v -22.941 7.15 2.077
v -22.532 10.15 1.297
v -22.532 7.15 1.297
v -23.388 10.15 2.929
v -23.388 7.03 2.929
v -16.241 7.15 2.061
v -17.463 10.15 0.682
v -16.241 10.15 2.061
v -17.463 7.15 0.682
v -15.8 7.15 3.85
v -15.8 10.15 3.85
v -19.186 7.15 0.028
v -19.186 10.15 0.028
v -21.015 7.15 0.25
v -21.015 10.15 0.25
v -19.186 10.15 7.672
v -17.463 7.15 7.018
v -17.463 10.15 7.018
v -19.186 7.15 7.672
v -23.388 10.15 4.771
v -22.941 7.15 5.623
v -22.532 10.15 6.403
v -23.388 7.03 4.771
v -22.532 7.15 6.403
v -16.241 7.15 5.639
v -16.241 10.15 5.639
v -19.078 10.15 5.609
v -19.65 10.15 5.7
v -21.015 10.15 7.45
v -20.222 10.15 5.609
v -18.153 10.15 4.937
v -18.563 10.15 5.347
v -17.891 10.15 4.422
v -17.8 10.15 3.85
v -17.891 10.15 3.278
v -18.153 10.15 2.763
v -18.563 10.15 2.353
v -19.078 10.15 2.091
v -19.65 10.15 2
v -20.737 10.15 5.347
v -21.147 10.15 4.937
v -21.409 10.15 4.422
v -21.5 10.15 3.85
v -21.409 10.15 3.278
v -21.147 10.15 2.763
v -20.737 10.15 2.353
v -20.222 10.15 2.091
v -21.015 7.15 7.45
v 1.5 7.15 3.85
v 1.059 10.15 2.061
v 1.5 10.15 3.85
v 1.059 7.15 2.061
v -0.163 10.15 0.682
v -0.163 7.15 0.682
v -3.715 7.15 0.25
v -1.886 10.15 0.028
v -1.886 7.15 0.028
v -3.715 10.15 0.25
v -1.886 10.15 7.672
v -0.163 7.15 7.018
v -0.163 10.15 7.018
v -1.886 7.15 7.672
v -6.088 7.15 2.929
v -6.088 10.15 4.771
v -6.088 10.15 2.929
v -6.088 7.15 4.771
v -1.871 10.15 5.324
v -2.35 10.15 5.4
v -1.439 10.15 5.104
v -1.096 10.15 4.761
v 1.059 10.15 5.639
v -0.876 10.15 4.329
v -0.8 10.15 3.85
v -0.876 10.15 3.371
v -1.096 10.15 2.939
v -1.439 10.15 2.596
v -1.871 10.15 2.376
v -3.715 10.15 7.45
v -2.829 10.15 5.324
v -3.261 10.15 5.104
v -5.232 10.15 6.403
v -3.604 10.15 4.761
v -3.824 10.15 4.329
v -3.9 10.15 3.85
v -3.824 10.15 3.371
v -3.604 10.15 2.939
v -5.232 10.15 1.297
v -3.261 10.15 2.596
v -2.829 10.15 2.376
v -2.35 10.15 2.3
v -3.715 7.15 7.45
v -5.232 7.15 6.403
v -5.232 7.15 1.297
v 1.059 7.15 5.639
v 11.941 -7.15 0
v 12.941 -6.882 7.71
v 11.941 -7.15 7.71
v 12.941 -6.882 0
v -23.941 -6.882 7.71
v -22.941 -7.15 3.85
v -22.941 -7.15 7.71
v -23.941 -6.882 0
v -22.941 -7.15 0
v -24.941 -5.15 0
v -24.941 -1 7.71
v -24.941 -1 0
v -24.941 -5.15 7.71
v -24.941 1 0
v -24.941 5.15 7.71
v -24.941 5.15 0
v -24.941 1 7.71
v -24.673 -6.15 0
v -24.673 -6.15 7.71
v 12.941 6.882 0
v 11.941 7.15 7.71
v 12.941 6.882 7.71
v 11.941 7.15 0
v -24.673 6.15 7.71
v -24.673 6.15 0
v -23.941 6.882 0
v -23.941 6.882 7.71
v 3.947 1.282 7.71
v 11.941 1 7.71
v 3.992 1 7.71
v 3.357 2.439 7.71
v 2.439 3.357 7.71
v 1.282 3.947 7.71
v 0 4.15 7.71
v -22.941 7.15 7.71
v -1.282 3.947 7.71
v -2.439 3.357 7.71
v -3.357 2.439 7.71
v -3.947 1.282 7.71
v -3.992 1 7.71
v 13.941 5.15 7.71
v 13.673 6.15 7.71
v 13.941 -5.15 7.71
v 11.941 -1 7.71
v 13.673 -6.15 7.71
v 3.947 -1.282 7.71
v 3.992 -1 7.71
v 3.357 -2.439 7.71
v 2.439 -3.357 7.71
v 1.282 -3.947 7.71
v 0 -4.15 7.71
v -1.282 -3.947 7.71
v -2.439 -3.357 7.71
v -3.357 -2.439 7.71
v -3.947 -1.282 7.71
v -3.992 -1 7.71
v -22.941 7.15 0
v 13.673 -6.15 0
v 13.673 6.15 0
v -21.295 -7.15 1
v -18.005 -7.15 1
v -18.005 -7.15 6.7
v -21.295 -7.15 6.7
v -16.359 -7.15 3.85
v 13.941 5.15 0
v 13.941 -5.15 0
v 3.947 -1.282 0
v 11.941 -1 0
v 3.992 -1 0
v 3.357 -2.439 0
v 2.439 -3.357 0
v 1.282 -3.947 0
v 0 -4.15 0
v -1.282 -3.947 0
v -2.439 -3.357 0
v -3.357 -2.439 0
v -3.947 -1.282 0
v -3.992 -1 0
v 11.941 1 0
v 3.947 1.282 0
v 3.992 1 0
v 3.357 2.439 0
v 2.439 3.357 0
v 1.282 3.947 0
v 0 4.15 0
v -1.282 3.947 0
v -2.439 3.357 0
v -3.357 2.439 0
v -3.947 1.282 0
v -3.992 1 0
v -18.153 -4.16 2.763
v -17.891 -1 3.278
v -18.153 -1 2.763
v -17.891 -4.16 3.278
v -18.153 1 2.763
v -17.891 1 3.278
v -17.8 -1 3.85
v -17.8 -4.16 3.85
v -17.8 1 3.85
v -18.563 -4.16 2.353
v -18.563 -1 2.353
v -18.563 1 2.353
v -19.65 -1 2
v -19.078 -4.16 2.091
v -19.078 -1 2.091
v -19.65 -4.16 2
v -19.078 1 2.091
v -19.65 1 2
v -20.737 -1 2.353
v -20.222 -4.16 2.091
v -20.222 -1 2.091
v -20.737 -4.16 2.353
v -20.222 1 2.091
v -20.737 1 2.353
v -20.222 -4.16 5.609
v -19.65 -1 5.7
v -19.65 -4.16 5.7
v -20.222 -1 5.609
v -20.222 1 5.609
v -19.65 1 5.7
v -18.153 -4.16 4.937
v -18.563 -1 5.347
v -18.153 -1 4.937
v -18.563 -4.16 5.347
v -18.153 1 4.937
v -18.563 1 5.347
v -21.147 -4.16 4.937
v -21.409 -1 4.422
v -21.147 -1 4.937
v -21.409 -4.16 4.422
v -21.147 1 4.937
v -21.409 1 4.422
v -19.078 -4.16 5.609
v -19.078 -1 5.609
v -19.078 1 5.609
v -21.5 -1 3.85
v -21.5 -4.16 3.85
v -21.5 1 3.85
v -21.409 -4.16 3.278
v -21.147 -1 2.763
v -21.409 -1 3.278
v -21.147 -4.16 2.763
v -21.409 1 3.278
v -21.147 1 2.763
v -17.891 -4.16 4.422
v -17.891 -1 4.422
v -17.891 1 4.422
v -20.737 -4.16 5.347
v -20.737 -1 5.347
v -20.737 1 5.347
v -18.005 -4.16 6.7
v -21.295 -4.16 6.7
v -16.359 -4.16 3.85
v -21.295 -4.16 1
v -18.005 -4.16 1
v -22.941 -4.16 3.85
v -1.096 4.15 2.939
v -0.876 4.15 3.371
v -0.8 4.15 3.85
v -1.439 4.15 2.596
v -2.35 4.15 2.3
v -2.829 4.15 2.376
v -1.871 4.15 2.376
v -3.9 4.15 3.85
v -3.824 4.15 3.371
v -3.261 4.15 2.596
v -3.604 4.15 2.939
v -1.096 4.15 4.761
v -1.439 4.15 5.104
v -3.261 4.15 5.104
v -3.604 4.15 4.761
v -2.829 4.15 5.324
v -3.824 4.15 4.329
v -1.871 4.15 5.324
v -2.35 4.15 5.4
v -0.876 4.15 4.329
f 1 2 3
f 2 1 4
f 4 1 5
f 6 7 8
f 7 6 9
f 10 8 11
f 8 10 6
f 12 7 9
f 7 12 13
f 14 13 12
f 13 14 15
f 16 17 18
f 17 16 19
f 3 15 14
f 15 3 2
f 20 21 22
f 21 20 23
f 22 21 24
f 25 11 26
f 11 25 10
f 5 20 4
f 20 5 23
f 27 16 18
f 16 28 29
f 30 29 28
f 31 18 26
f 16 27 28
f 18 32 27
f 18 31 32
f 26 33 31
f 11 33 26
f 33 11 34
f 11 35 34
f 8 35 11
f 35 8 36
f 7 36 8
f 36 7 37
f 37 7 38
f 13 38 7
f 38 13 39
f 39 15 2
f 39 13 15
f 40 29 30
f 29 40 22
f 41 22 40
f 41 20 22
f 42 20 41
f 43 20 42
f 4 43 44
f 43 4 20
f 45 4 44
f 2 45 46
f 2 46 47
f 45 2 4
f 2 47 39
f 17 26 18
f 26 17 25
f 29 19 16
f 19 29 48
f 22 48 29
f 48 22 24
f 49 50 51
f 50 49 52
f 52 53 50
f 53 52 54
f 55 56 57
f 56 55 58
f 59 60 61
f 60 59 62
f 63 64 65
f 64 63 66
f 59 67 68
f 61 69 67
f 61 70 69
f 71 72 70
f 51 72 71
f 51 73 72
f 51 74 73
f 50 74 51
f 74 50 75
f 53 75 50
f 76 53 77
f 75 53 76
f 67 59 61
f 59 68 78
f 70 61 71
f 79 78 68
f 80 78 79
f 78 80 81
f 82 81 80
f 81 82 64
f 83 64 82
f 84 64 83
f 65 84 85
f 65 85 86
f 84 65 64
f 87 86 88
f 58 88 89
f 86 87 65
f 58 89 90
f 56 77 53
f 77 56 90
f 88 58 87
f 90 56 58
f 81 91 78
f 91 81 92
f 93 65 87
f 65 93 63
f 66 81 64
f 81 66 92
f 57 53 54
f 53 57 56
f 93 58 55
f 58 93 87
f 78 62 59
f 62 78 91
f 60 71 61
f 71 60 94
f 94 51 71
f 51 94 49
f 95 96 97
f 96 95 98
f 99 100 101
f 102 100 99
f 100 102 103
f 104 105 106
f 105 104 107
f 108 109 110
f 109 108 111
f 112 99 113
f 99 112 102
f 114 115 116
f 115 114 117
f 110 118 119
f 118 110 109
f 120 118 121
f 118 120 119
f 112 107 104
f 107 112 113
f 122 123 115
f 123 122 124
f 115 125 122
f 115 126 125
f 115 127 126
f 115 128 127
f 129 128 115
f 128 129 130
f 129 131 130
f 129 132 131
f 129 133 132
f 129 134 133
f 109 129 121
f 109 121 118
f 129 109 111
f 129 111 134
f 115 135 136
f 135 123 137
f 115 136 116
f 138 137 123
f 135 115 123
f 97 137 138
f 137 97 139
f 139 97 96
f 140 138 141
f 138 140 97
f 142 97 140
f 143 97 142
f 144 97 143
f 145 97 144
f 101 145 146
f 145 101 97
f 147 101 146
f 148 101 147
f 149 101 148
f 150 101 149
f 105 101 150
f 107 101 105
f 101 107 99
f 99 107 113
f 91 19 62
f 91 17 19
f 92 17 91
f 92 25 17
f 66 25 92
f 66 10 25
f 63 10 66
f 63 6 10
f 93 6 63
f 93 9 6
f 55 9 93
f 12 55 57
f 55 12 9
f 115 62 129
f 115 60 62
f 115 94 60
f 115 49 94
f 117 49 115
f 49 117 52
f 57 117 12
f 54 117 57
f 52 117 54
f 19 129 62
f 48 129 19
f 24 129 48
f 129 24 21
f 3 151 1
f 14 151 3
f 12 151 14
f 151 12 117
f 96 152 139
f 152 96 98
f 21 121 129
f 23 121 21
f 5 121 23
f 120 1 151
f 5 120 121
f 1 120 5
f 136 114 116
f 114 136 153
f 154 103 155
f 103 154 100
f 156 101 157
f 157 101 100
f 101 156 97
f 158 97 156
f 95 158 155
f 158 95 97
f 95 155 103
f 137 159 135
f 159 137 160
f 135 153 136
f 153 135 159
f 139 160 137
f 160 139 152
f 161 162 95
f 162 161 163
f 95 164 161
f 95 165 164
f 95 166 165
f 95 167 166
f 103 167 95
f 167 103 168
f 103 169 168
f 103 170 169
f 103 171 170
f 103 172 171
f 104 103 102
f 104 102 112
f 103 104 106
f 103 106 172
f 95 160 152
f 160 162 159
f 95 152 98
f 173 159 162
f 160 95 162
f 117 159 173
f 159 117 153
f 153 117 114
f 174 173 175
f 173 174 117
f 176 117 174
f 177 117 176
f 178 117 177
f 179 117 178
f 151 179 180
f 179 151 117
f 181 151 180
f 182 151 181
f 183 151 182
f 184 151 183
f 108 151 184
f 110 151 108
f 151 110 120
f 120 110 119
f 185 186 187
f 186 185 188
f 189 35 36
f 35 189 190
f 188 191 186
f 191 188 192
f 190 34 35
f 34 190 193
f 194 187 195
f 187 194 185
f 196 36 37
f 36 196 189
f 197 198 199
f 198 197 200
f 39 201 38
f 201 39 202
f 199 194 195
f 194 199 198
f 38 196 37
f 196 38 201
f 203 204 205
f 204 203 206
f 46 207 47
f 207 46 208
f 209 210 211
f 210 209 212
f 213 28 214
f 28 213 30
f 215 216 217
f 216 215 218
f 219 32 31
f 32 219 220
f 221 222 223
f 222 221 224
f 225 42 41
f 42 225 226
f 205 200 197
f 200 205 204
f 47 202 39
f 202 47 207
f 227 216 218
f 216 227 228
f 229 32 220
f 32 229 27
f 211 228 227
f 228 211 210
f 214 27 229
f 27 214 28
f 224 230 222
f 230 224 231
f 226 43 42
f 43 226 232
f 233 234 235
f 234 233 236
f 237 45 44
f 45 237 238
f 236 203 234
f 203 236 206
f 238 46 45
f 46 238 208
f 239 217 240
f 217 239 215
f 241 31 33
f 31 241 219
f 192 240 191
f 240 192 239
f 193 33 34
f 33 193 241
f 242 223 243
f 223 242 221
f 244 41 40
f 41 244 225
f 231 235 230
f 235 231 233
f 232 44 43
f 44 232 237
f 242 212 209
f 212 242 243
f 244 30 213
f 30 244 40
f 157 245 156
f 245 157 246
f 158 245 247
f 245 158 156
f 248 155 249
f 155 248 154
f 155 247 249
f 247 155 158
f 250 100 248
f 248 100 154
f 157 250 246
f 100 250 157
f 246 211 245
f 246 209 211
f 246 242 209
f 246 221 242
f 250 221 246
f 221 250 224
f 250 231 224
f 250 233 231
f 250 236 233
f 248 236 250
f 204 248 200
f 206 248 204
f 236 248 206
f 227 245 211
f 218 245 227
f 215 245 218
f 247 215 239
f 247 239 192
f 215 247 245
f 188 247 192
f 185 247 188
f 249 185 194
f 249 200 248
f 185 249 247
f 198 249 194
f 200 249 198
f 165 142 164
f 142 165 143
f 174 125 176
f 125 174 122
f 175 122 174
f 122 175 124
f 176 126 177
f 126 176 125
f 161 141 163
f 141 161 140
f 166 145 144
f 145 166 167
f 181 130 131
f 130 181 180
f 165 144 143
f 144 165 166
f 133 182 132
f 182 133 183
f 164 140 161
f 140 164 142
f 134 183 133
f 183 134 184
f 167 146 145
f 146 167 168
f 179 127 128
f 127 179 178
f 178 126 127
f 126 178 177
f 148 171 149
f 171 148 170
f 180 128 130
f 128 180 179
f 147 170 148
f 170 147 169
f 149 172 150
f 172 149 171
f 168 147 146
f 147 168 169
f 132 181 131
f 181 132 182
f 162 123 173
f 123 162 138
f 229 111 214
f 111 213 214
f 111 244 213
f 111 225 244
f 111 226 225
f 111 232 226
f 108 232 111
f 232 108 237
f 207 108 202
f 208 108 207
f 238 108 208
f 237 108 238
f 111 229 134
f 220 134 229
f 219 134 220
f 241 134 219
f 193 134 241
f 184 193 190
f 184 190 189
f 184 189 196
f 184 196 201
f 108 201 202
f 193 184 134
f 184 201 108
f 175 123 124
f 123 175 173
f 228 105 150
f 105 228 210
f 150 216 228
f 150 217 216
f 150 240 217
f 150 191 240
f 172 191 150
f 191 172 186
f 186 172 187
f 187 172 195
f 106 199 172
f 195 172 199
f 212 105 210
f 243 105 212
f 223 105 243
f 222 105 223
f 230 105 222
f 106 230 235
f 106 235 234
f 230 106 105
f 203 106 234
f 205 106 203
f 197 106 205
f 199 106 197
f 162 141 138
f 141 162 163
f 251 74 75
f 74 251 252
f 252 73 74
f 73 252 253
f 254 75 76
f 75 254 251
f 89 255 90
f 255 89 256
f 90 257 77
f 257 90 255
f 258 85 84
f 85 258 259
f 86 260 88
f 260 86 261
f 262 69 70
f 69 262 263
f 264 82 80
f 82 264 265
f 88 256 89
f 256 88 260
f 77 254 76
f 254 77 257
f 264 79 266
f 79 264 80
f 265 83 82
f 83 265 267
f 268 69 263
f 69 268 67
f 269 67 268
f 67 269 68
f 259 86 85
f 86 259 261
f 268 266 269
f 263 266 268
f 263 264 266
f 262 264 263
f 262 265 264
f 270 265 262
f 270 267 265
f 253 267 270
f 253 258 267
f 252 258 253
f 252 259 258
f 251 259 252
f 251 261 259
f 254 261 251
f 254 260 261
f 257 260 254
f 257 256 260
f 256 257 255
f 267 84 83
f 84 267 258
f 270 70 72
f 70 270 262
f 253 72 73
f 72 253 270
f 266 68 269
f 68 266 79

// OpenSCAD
// mount for hall effect sensors from RepRapDiscount

screw_dia = 3.7;
screw_spacing = 17.3;

// self tapping screw
st_screw_dia = 3.1;
st_screw_depth = 6;

rod_dia = 8.3;
nut_wrench = 5.7;
nut_dia = nut_wrench/cos(30);
nut_height=3;
spacing_from_rod = 6;
clamp_depth = 3; // depth beyond rod
buffer = 2;

// tweaks per machine
standoff_height = max(spacing_from_rod, clamp_depth+buffer);
offset = 11; // amount to move the sensor to the side

main_height = max(nut_dia, screw_dia+buffer*2);
main_depth = rod_dia + clamp_depth*2;
main_width = screw_spacing+nut_dia;

difference()
{
	solids();
	holes();
}

module solids()
{
		hull()
		{
			for(x=[-main_width/2-offset, main_width/2])
				for (y=[-main_depth/2+buffer, main_depth/2-buffer])
					translate([x,y,0])
						cylinder(r=buffer, h=main_height+0.01, $fn=12);
		}

	// standoffs
	translate([-offset,0,0])
	for (x=[-1,1])
	{
		translate([screw_spacing/2*x, rod_dia/2, main_height/2])
			rotate([-90,0,0])
				cylinder(r=screw_dia/2 + buffer, h=standoff_height);
	}
}

module holes()
{
	// hole for rod
	cylinder(r=rod_dia/2, h=main_height+0.01, $fn=20);

	// compression slice
	translate([-buffer-offset/2, 0,main_height/2])
		cube([screw_spacing+nut_dia+buffer*2+offset, buffer, main_height+0.1], center=true);

	// screw holes
	// machine screw
	translate([-screw_spacing/2-offset, -main_depth/2-0.01, main_height/2])
		rotate([-90,0,0])
		{
			// screw hole
			cylinder(r=screw_dia/2, h=main_depth+standoff_height, $fn=20);
			// nut trap
			cylinder(r=nut_dia/2, h=nut_height, $fn=6);
		}

	// self tapping screw
	translate([screw_spacing/2-offset, rod_dia/2+standoff_height-st_screw_depth, main_height/2])
		rotate([-90,0,0])
		{
			// screw hole
			cylinder(r=st_screw_dia/2, h=st_screw_depth, $fn=20);
		}

}
